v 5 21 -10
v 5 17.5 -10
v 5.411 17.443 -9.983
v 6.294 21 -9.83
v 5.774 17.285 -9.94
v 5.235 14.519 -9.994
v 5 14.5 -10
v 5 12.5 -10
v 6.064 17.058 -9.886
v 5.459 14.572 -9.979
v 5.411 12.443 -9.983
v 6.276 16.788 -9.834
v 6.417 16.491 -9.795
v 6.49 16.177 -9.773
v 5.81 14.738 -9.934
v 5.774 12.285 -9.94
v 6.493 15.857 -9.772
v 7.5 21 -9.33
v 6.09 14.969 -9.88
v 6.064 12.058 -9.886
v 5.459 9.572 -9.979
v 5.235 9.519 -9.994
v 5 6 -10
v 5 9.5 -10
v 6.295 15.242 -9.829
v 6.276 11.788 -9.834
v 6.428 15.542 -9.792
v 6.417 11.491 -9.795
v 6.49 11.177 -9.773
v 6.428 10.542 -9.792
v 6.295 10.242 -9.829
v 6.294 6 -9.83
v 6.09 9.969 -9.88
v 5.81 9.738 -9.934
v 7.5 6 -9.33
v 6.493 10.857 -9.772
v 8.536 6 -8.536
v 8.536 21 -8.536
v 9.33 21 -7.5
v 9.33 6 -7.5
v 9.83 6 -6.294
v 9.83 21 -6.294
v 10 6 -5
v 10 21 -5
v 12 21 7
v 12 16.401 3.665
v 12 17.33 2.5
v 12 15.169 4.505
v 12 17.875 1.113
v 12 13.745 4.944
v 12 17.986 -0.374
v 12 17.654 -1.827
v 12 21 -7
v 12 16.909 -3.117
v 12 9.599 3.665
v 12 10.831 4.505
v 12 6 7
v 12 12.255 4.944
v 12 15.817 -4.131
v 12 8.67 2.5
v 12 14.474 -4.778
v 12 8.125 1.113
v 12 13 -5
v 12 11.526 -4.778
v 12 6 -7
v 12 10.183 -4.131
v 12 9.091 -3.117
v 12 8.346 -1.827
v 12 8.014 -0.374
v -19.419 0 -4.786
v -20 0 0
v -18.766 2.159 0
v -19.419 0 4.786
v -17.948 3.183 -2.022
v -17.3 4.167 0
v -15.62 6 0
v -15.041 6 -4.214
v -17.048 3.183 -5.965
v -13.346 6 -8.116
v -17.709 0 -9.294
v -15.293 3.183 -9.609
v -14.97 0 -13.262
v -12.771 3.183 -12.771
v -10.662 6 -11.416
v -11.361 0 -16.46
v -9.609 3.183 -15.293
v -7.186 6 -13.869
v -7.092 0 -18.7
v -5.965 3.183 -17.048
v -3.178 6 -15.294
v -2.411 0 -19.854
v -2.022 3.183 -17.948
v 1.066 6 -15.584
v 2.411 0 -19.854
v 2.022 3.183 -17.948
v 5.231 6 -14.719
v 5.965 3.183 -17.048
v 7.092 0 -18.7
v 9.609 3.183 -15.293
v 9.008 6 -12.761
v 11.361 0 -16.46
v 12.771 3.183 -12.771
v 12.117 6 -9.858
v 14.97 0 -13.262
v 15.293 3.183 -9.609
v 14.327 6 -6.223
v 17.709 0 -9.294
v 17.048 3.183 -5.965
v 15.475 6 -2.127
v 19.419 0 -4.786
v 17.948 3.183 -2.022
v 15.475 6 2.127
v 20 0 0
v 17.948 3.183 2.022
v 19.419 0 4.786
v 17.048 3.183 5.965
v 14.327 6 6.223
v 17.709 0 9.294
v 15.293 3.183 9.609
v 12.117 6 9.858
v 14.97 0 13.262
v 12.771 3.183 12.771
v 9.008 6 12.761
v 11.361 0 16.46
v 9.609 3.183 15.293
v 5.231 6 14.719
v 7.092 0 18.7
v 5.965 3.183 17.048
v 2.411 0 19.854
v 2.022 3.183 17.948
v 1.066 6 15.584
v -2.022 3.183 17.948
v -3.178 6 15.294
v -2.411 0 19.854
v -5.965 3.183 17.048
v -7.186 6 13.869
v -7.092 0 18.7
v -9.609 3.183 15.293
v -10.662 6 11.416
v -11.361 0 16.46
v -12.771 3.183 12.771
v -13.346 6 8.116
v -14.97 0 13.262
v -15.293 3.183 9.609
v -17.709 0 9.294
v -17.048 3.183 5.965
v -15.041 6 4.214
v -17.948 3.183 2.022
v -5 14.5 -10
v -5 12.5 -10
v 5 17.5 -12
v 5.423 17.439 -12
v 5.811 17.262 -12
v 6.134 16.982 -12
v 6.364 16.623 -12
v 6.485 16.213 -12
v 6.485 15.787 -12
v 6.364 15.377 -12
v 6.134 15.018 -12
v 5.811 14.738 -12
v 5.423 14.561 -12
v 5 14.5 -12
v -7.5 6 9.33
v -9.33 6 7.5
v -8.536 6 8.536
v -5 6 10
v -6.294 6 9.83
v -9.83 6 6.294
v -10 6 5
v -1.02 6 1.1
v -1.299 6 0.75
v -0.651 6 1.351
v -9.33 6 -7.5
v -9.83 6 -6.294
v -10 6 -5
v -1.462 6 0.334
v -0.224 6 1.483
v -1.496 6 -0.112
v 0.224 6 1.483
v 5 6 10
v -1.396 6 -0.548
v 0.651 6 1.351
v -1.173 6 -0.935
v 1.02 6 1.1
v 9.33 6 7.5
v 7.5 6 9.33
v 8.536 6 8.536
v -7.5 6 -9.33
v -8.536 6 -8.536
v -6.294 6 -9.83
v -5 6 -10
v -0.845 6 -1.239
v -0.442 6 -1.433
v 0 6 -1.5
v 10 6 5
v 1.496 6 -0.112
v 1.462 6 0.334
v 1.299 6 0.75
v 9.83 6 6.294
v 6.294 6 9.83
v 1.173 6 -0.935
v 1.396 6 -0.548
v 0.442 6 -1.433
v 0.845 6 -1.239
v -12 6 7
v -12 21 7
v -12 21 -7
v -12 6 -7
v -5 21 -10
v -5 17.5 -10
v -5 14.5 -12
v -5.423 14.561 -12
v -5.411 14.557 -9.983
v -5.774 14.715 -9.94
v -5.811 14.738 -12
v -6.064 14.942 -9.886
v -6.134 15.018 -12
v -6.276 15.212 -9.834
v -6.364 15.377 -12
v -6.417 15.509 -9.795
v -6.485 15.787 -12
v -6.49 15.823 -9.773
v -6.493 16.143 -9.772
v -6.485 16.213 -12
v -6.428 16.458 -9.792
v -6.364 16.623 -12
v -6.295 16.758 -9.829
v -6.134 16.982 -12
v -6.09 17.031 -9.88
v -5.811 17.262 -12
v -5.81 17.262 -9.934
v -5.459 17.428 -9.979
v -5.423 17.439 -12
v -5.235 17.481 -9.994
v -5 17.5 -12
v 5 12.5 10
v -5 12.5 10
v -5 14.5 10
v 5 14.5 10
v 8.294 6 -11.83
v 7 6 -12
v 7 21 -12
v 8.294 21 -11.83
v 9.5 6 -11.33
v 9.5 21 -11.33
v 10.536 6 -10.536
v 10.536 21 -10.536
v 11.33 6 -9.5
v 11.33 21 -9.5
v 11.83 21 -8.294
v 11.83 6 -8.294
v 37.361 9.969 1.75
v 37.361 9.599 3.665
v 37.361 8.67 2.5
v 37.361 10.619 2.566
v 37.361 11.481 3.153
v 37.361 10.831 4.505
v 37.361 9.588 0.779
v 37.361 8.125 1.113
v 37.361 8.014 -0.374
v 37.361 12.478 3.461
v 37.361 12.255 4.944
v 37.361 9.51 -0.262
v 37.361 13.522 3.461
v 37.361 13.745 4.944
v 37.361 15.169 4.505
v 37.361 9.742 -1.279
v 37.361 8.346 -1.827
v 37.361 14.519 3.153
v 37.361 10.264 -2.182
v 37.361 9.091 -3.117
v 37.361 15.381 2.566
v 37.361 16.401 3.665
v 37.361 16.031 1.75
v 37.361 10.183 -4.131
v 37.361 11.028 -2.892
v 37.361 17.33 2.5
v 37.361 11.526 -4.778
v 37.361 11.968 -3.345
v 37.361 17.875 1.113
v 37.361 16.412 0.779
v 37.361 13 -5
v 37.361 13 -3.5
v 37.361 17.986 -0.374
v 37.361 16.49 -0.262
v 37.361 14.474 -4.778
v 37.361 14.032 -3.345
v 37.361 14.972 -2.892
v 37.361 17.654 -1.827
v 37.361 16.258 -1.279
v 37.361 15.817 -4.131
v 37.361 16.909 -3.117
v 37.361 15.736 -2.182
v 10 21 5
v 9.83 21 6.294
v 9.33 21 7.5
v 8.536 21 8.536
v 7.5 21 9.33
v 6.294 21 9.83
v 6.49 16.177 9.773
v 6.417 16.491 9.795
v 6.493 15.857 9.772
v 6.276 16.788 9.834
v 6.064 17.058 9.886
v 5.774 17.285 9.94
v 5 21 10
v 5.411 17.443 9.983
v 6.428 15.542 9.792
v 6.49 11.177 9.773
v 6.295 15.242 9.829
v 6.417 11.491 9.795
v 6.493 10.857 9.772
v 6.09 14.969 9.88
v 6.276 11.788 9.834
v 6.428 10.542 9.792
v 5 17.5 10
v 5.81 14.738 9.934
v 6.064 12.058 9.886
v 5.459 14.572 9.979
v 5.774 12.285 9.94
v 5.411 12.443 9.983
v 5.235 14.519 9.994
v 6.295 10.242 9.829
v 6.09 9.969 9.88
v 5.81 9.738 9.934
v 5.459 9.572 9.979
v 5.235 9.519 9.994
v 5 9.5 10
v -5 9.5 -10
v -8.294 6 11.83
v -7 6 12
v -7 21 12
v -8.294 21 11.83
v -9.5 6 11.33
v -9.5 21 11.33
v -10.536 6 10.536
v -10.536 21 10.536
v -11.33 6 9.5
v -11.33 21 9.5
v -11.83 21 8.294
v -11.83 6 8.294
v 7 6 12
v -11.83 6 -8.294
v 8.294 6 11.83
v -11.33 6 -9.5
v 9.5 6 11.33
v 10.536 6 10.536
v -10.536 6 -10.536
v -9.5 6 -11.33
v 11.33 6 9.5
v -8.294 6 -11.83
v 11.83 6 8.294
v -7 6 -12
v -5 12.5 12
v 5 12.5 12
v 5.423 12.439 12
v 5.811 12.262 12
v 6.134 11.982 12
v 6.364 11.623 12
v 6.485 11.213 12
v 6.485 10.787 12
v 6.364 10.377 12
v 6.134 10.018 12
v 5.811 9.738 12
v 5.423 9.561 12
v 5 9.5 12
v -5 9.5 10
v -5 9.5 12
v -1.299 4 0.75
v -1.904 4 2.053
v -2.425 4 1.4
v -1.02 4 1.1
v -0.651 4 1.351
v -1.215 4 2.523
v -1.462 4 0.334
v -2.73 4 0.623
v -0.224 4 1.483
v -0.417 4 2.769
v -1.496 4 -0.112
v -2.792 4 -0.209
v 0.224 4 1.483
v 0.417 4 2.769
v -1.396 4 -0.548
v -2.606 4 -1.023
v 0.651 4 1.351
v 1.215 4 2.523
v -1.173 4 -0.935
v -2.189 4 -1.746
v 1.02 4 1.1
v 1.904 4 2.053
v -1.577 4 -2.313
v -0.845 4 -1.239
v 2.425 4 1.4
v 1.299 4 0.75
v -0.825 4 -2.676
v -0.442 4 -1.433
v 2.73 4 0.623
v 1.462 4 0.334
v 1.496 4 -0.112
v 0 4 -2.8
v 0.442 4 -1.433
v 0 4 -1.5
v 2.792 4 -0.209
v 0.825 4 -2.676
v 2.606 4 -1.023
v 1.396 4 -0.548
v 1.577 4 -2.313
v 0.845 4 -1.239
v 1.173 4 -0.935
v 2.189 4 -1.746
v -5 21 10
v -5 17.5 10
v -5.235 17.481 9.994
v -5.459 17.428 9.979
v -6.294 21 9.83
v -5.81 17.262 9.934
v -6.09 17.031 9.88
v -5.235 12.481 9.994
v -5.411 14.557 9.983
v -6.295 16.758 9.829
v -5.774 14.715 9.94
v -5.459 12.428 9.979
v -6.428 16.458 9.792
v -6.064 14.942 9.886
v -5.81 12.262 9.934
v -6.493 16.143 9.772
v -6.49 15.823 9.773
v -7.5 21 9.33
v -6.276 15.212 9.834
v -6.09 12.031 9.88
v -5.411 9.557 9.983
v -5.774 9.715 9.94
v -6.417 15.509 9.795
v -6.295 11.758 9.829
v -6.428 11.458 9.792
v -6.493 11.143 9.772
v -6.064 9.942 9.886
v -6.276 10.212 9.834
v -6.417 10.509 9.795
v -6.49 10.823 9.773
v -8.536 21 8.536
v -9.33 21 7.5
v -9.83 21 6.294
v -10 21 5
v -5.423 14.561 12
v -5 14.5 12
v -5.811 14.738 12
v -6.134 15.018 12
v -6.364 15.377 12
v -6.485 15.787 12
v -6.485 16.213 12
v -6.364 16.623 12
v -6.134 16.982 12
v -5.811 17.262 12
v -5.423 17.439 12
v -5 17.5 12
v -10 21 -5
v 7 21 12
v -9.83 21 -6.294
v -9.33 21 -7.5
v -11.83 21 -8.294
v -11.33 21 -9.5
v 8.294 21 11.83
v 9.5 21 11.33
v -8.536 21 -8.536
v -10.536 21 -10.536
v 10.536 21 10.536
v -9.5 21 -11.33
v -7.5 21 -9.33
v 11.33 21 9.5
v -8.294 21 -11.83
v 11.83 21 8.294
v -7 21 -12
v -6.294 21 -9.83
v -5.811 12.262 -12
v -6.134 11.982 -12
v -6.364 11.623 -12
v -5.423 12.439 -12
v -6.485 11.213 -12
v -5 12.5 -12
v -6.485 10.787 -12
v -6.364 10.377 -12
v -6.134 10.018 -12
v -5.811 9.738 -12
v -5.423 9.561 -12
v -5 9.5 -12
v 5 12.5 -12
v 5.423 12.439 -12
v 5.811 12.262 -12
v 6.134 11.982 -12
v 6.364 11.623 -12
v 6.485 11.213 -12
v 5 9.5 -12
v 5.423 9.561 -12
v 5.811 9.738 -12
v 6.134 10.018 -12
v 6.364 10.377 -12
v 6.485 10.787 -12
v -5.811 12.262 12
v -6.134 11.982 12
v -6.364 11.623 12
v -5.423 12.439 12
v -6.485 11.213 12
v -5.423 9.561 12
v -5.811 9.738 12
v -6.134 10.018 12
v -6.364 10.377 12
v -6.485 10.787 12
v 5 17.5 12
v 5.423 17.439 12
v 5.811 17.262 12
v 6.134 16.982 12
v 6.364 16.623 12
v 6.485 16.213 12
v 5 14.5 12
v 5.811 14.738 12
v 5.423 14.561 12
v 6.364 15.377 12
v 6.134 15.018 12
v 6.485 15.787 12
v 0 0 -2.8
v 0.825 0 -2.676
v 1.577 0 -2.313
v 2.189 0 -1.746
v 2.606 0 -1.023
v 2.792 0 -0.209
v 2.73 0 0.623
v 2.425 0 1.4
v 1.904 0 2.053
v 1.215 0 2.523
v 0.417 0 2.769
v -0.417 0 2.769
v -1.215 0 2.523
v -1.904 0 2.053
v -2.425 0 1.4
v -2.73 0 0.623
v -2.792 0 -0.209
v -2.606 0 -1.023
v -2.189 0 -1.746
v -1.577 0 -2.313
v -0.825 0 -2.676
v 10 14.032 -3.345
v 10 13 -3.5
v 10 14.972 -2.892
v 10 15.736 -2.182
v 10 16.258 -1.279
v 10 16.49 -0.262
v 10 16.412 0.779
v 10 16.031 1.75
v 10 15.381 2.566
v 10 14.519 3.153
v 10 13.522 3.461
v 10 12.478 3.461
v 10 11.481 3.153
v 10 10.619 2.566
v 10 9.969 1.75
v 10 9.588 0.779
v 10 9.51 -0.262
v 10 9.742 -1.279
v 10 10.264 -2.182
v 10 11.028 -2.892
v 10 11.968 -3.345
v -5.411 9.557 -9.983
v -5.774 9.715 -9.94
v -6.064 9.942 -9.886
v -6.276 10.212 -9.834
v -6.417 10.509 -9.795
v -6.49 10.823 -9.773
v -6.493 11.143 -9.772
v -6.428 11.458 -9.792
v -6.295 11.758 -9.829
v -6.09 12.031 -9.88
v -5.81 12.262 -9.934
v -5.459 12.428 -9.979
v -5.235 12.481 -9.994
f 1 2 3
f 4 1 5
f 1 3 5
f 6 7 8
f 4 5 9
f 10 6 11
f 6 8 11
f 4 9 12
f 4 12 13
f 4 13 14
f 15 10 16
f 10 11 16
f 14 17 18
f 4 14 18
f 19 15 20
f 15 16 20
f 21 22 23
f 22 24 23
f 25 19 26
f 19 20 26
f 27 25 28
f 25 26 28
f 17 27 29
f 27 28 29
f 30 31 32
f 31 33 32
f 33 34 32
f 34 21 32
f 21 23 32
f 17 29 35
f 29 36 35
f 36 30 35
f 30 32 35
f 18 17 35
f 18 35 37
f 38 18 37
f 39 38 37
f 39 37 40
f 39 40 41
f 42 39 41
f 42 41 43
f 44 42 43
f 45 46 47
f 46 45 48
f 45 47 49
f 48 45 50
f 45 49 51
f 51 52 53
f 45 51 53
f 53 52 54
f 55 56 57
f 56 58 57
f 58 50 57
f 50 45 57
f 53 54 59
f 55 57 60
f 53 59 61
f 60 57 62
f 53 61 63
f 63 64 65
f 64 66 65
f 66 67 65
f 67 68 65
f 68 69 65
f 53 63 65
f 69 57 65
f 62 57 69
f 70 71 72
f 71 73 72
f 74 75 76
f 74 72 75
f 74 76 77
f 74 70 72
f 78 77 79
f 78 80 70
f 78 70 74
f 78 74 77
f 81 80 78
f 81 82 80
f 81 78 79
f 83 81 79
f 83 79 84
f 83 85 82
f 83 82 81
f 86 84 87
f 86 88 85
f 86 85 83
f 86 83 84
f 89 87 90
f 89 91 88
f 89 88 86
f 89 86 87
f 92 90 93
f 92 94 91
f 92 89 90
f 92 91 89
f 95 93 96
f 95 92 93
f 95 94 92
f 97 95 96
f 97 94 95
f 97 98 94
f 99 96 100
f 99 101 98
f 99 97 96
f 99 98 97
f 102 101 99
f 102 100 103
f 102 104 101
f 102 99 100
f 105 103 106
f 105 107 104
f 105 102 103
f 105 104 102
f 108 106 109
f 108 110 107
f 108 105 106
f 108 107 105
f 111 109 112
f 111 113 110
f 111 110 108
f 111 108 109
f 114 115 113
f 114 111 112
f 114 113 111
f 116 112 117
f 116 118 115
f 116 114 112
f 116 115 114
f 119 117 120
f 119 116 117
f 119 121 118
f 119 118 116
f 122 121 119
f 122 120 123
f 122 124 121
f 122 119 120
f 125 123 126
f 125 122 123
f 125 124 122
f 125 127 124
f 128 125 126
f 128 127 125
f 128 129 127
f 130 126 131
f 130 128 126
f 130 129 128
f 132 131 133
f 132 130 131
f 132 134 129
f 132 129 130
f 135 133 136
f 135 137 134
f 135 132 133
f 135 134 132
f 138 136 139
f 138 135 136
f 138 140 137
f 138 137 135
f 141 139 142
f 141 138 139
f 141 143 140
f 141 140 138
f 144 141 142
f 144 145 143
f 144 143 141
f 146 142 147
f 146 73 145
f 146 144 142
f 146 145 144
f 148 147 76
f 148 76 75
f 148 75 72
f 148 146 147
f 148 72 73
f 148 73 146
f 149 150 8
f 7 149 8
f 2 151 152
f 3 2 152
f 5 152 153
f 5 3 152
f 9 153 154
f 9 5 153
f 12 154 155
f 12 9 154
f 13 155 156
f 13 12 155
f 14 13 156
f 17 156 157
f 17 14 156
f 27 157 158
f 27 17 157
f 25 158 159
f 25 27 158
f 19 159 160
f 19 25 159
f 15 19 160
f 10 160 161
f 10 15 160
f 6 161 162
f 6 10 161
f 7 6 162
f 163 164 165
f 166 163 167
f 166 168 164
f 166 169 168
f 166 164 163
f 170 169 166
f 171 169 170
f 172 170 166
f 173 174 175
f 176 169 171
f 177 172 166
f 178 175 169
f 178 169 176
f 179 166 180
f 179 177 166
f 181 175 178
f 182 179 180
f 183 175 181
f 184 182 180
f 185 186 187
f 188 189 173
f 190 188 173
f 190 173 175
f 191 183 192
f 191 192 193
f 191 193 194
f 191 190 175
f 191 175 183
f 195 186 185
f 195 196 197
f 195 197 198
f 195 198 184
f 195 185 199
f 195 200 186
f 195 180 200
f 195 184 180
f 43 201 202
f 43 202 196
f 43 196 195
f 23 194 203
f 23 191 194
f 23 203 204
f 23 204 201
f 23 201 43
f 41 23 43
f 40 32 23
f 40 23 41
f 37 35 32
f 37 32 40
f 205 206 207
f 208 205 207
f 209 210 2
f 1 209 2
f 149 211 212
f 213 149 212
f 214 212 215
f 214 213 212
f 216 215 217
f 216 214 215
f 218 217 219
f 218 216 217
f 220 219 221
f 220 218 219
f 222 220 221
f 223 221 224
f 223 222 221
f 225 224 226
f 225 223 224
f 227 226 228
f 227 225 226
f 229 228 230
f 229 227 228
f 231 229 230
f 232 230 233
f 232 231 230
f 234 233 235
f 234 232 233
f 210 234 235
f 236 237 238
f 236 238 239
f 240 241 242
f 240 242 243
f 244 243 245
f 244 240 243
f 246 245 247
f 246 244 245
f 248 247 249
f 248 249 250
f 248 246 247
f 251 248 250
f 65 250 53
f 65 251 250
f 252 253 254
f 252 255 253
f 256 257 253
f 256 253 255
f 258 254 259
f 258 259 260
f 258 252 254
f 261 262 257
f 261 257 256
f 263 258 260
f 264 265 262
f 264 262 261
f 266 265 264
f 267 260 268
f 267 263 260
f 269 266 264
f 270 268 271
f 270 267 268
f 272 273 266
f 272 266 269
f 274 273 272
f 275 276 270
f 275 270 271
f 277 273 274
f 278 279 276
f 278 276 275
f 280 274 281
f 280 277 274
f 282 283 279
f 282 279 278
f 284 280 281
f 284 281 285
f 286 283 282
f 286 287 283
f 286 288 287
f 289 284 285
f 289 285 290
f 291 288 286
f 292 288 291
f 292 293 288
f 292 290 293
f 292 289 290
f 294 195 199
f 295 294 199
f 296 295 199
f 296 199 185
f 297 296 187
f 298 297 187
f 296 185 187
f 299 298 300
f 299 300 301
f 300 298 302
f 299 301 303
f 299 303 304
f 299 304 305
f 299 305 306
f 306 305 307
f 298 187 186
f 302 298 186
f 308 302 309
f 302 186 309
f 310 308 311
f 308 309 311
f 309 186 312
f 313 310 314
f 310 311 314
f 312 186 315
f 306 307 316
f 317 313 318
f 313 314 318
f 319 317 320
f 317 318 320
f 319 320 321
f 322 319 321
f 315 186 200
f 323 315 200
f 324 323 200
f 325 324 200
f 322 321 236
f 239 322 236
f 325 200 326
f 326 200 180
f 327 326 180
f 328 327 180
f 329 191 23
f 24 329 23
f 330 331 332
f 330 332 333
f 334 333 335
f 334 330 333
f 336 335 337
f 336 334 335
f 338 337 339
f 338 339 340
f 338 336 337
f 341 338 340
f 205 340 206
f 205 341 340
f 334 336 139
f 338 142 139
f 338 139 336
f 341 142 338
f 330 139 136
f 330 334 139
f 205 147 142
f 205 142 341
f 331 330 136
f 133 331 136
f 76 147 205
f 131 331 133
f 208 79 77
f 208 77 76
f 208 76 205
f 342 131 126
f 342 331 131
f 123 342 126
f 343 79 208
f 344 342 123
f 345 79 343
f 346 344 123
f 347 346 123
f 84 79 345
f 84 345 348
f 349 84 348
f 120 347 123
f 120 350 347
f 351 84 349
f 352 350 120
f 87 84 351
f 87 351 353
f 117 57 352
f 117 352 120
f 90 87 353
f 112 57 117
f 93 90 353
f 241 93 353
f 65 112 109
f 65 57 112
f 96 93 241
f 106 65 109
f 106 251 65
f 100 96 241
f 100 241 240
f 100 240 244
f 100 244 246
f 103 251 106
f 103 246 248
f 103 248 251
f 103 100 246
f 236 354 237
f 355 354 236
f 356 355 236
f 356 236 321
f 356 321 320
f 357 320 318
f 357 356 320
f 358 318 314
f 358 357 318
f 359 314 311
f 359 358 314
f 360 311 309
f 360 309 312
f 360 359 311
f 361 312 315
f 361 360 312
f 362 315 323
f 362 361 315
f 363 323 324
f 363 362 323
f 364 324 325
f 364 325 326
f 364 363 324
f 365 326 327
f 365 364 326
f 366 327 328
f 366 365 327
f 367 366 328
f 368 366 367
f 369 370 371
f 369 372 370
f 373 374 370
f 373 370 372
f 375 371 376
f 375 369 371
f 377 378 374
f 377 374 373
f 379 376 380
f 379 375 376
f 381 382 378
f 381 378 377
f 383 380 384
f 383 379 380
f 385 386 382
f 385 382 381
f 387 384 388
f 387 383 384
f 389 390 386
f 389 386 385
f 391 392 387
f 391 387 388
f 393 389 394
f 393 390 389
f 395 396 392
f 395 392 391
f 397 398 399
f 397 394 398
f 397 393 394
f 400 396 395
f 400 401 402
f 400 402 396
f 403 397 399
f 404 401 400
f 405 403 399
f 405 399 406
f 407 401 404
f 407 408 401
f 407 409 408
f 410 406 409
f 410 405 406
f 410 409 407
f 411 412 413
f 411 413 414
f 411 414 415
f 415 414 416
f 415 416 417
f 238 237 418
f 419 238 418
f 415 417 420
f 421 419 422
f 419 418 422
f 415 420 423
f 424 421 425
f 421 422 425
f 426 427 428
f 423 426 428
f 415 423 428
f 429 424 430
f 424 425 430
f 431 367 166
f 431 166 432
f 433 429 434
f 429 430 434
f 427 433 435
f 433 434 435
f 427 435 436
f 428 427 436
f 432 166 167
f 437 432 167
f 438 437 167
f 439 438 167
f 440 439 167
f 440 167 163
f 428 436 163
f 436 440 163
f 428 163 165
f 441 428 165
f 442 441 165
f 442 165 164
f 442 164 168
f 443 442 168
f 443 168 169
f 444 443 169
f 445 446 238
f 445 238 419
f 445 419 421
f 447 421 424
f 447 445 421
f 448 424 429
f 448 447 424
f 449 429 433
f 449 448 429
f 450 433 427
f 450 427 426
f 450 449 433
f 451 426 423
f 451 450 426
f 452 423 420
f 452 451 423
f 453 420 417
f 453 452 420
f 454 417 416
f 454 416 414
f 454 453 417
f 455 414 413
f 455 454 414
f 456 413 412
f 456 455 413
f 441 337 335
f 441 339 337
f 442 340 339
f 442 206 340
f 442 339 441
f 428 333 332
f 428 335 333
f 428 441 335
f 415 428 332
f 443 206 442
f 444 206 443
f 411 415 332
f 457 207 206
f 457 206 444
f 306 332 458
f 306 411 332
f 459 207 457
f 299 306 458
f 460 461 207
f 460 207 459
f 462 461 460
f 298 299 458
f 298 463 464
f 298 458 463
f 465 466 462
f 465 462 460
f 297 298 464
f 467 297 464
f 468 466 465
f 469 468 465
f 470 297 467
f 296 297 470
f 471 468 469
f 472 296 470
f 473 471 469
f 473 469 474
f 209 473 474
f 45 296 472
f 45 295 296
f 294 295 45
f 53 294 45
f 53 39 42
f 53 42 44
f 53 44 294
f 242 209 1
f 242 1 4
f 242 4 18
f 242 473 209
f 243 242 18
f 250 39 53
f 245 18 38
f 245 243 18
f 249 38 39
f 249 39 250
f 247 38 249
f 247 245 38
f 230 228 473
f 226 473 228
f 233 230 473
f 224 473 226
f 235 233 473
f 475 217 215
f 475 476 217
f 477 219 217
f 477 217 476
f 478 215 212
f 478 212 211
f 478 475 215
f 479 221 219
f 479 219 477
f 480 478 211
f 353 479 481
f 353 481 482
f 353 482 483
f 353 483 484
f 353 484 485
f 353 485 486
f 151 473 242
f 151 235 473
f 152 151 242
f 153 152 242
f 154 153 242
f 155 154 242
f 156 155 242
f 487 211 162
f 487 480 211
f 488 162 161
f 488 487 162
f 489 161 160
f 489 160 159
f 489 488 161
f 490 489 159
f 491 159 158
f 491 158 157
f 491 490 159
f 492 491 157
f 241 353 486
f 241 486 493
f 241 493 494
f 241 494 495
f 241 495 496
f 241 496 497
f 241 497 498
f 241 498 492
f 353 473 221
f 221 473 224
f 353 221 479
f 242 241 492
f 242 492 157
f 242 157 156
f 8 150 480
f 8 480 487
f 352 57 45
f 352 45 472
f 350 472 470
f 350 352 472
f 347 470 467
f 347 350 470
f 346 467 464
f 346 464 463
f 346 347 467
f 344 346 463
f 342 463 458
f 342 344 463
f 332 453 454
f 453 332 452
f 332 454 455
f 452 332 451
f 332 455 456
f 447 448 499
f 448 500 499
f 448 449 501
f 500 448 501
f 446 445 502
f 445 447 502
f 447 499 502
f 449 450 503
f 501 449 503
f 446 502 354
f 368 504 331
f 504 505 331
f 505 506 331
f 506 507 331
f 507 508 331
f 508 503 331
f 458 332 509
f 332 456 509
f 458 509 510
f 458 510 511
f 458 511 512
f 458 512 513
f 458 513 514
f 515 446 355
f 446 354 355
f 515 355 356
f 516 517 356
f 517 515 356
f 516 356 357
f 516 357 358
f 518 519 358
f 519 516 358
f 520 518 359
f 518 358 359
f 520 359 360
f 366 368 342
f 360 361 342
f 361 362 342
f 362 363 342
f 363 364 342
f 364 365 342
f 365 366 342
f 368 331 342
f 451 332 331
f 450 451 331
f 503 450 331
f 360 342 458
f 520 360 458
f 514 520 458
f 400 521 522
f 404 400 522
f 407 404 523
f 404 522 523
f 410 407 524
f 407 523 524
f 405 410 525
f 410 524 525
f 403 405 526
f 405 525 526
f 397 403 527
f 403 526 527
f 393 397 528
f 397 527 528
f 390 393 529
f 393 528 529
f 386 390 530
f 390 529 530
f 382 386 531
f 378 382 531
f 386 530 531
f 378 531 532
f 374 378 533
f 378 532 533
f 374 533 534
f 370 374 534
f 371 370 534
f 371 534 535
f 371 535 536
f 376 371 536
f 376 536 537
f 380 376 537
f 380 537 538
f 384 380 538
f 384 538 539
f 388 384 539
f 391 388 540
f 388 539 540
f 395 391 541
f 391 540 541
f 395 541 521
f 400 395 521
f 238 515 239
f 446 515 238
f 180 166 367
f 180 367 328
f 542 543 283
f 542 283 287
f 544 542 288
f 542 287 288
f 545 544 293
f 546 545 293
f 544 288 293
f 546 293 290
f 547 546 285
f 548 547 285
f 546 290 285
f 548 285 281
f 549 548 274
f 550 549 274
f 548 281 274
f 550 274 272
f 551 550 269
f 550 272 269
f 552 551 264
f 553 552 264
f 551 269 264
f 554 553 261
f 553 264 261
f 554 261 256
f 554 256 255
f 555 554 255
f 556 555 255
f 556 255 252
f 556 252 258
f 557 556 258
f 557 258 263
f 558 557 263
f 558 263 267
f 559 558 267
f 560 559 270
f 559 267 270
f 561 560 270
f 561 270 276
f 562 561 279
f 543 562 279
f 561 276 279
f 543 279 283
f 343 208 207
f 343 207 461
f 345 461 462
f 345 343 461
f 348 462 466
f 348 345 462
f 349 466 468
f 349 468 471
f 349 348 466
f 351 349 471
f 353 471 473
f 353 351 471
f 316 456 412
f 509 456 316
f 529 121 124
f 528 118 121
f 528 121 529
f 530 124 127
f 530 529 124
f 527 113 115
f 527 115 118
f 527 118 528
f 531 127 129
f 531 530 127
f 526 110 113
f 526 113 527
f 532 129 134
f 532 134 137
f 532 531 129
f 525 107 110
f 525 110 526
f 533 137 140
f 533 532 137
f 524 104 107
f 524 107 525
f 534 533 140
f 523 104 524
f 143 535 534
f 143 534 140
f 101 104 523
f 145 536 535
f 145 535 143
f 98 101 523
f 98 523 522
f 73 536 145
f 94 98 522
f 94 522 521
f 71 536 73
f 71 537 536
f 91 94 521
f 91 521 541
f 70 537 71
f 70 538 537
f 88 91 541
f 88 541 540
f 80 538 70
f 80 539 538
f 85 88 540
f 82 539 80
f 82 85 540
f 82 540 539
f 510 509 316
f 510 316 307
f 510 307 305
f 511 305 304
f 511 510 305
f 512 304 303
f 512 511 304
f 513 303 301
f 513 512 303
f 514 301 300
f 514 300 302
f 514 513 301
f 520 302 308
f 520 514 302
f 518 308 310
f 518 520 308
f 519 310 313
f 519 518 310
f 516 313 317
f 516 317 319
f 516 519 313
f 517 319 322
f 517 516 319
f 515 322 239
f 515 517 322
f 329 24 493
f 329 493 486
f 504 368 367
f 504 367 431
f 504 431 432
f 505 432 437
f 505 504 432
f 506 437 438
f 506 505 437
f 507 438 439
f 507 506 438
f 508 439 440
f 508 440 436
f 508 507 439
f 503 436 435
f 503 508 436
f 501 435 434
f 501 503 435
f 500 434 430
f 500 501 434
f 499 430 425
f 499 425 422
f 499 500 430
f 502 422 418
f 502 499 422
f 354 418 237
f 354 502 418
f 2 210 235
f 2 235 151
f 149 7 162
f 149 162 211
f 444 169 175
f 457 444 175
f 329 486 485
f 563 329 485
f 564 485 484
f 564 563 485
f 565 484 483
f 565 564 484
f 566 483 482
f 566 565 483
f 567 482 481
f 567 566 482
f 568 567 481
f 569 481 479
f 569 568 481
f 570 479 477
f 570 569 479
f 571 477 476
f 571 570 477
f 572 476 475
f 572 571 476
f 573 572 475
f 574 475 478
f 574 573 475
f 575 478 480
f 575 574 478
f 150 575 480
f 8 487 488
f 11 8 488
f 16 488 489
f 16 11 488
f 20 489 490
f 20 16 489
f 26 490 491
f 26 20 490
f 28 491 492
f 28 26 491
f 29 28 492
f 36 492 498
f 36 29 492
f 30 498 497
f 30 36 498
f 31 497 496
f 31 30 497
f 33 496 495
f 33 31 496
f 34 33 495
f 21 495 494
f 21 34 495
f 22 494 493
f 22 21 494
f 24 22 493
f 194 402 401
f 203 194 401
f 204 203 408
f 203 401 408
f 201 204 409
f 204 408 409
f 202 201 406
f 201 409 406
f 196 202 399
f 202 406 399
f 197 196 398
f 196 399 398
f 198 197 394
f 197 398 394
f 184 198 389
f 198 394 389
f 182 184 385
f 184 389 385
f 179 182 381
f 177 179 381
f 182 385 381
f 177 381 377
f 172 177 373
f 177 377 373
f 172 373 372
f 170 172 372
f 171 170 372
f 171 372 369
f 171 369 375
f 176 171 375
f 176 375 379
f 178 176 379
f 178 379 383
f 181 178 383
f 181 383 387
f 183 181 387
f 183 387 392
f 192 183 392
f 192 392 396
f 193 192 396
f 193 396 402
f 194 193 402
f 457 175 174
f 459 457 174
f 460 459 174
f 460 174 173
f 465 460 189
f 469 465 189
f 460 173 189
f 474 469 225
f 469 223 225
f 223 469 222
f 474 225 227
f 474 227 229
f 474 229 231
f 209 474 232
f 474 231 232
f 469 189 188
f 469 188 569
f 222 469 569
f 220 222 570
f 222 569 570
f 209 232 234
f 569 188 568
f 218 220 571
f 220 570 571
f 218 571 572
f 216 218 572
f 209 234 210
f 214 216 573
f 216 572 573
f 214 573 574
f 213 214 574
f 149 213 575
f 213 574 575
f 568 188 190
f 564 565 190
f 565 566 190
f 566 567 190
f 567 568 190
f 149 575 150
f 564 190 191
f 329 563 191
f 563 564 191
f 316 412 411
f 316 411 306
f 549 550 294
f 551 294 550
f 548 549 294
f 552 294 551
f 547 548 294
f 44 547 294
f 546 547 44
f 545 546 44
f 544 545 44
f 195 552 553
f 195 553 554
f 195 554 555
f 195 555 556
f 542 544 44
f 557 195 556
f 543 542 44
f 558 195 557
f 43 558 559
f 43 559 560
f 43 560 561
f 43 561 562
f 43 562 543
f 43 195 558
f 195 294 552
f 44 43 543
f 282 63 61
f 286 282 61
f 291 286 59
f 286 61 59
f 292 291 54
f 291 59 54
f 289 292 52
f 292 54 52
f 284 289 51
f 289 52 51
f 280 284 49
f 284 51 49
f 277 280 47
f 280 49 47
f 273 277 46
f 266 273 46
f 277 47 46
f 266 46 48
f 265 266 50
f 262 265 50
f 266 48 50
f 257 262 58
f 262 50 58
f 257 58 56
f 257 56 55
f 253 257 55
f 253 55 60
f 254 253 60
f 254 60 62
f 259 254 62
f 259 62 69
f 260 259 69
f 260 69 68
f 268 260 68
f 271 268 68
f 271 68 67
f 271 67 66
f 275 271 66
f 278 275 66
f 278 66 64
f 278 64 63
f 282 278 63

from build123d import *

# Parameters (mm, degrees)
SKETCH_3_R                      = 2.8
CUT_EXTRUDE_2_DEPTH             = 4
SKETCH_8_R                      = 1.5
CUT_EXTRUDE_5_DEPTH             = 4
SKETCH_10_W                     = 24
SKETCH_10_H                     = 24
SKETCH_10_W_2                   = 20
SKETCH_10_H_2                   = 20
EXTRUDE_1_DEPTH                 = 15
EXTRUDE_2_DEPTH                 = 15
EXTRUDE_2_DEPTH_BACK            = 12
SKETCH_7_R                      = 5
SKETCH_7_R_2                    = 3.5
SKETCH_7_5_R                    = 3.5
CUT_EXTRUDE_6_DEPTH             = 12.360679775
FILLET_START                    = 6
FILLET_1_DEPTH                  = 15
FILLET_1_2_DEPTH                = 15
CUT_EXTRUDE_7_REACH             = 55.487
CUT_EXTRUDE_7_DIRECTION_2_DEPTH = 54.486637521


with BuildPart() as part:
    # 草图1 → 旋转1 (revolve)
    with BuildSketch(Plane.XY):
        with BuildLine():
            ThreePointArc((-15.620499352, 6), (-18.061145964, 3.183133409), (-20, 0))
            Line((-20, 0), (0, 0))
            Line((0, 0), (0, 6))
            Line((0, 6), (-15.620499352, 6))
        make_face()
    revolve(axis=Axis((0, 10, 0), (0, -1, 0)))

    # 草图3 → 切除-拉伸2 (cut)
    with BuildSketch(Plane.XZ):
        with Locations(Location((0, 0, 0), (0, 0, 270))):
            Circle(SKETCH_3_R)
    extrude(amount=-CUT_EXTRUDE_2_DEPTH, mode=Mode.SUBTRACT)

    # 草图8 → 切除-拉伸5 (cut)
    with BuildSketch(Plane.XZ.offset(-4)):
        with Locations(Location((0, 0, 0), (0, 0, 270))):
            Circle(SKETCH_8_R)
    extrude(amount=-CUT_EXTRUDE_5_DEPTH, mode=Mode.SUBTRACT)

    # 草图10 → 拉伸-薄壁1 (add)
    with BuildSketch(Plane(origin=(0, 6, 0), x_dir=(1, 0, 0), z_dir=(0, 1, 0))):
        Rectangle(SKETCH_10_W, SKETCH_10_H)
        Rectangle(SKETCH_10_W_2, SKETCH_10_H_2, mode=Mode.SUBTRACT)
    extrude(amount=EXTRUDE_1_DEPTH)

    # 草图7 → 凸台-拉伸2 (add, two sides: drawn at the far end of the back side and taken through both)
    with BuildSketch(Plane(origin=(22.360679775, 0, 0), x_dir=(0, 0, -1), z_dir=(1, 0, 0)).offset(-EXTRUDE_2_DEPTH_BACK)):
        with Locations((0, 13)):
            Circle(SKETCH_7_R)
        with Locations((0, 13)):
            Circle(SKETCH_7_R_2, mode=Mode.SUBTRACT)
    extrude(amount=EXTRUDE_2_DEPTH + EXTRUDE_2_DEPTH_BACK)

    # 草图7<5> → 切除-拉伸6 (cut)
    with BuildSketch(Plane(origin=(22.360679775, 0, 0), x_dir=(0, 0, -1), z_dir=(1, 0, 0))):
        with Locations((0, 13)):
            Circle(SKETCH_7_5_R)
    extrude(amount=-CUT_EXTRUDE_6_DEPTH, mode=Mode.SUBTRACT)

    # 圆角1: read off the stored shape, not the designer's step
    # 圆角1 outline → 圆角1 (cut)
    with BuildSketch(Plane(origin=(0, 0, 0), x_dir=(1, 0, 0), z_dir=(0, 1, 0)).offset(FILLET_START)):
        with BuildLine():
            ThreePointArc((-12, 7), (-10.535533906, 10.535533906), (-7, 12))
            Line((-7, 12), (-12, 12))
            Line((-12, 12), (-12, 7))
        make_face()
        with BuildLine():
            Line((12, 12), (7, 12))
            ThreePointArc((7, 12), (10.535533906, 10.535533906), (12, 7))
            Line((12, 7), (12, 12))
        make_face()
        with BuildLine():
            ThreePointArc((-7, -12), (-10.535533906, -10.535533906), (-12, -7))
            Line((-12, -7), (-12, -12))
            Line((-12, -12), (-7, -12))
        make_face()
        with BuildLine():
            Line((12, -12), (12, -7))
            ThreePointArc((12, -7), (10.535533906, -10.535533906), (7, -12))
            Line((7, -12), (12, -12))
        make_face()
    extrude(amount=FILLET_1_DEPTH, mode=Mode.SUBTRACT)

    # Fillet 1 2 outline → Fillet 1 2 (add)
    with BuildSketch(Plane(origin=(0, 0, 0), x_dir=(1, 0, 0), z_dir=(0, 1, 0)).offset(FILLET_START)):
        with BuildLine():
            Line((10, -10), (10, -5))
            ThreePointArc((10, -5), (8.535533906, -8.535533906), (5, -10))
            Line((5, -10), (10, -10))
        make_face()
        with BuildLine():
            ThreePointArc((5, 10), (8.535533906, 8.535533906), (10, 5))
            Line((10, 5), (10, 10))
            Line((10, 10), (5, 10))
        make_face()
        with BuildLine():
            Line((-10, -10), (-5, -10))
            ThreePointArc((-5, -10), (-8.535533906, -8.535533906), (-10, -5))
            Line((-10, -5), (-10, -10))
        make_face()
        with BuildLine():
            ThreePointArc((-10, 5), (-8.535533906, 8.535533906), (-5, 10))
            Line((-5, 10), (-10, 10))
            Line((-10, 10), (-10, 5))
        make_face()
    extrude(amount=FILLET_1_2_DEPTH)

    # 切除-拉伸7: up to this face of the body (flat: up to its plane)
    cut_extrude_7_end = Plane(part.part.faces().sort_by_distance((0, 13.5, -12))[0])
    # 草图13 → 切除-拉伸7 (cut, up to the picked face)
    with BuildSketch(Plane.XY.offset(12), mode=Mode.PRIVATE) as cut_extrude_7_sk1:
        with BuildLine():
            Line((-5, 17.5), (5, 17.5))
            ThreePointArc((5, 17.5), (6.5, 16), (5, 14.5))
            Line((5, 14.5), (-5, 14.5))
            ThreePointArc((-5, 14.5), (-6.5, 16), (-5, 17.5))
        make_face()
    cut_extrude_7_tool1 = split(extrude(cut_extrude_7_sk1.sketch, amount=-CUT_EXTRUDE_7_REACH, mode=Mode.PRIVATE), bisect_by=cut_extrude_7_end, keep=Keep.BOTH, mode=Mode.PRIVATE)
    # 草图13 → 切除-拉伸7 (cut, up to the picked face)
    with BuildSketch(Plane.XY.offset(12), mode=Mode.PRIVATE) as cut_extrude_7_sk2:
        with BuildLine():
            Line((-5, 12.5), (5, 12.5))
            ThreePointArc((5, 12.5), (6.5, 11), (5, 9.5))
            Line((5, 9.5), (-5, 9.5))
            ThreePointArc((-5, 9.5), (-6.5, 11), (-5, 12.5))
        make_face()
    cut_extrude_7_tool2 = split(extrude(cut_extrude_7_sk2.sketch, amount=-CUT_EXTRUDE_7_REACH, mode=Mode.PRIVATE), bisect_by=cut_extrude_7_end, keep=Keep.BOTH, mode=Mode.PRIVATE)
    add(cut_extrude_7_tool1.solids().sort_by(Axis((0, 16, 12), (0, 0, -1)))[0], mode=Mode.SUBTRACT)
    add(cut_extrude_7_tool2.solids().sort_by(Axis((0, 11, 12), (0, 0, -1)))[0], mode=Mode.SUBTRACT)

    # 草图13 → 切除-拉伸7 direction 2 (cut)
    with BuildSketch(Plane.XY.offset(12)):
        with BuildLine():
            Line((-5, 17.5), (5, 17.5))
            ThreePointArc((5, 17.5), (6.5, 16), (5, 14.5))
            Line((5, 14.5), (-5, 14.5))
            ThreePointArc((-5, 14.5), (-6.5, 16), (-5, 17.5))
        make_face()
        with BuildLine():
            Line((-5, 12.5), (5, 12.5))
            ThreePointArc((5, 12.5), (6.5, 11), (5, 9.5))
            Line((5, 9.5), (-5, 9.5))
            ThreePointArc((-5, 9.5), (-6.5, 11), (-5, 12.5))
        make_face()
    extrude(amount=CUT_EXTRUDE_7_DIRECTION_2_DEPTH, mode=Mode.SUBTRACT)


solid = part.part
